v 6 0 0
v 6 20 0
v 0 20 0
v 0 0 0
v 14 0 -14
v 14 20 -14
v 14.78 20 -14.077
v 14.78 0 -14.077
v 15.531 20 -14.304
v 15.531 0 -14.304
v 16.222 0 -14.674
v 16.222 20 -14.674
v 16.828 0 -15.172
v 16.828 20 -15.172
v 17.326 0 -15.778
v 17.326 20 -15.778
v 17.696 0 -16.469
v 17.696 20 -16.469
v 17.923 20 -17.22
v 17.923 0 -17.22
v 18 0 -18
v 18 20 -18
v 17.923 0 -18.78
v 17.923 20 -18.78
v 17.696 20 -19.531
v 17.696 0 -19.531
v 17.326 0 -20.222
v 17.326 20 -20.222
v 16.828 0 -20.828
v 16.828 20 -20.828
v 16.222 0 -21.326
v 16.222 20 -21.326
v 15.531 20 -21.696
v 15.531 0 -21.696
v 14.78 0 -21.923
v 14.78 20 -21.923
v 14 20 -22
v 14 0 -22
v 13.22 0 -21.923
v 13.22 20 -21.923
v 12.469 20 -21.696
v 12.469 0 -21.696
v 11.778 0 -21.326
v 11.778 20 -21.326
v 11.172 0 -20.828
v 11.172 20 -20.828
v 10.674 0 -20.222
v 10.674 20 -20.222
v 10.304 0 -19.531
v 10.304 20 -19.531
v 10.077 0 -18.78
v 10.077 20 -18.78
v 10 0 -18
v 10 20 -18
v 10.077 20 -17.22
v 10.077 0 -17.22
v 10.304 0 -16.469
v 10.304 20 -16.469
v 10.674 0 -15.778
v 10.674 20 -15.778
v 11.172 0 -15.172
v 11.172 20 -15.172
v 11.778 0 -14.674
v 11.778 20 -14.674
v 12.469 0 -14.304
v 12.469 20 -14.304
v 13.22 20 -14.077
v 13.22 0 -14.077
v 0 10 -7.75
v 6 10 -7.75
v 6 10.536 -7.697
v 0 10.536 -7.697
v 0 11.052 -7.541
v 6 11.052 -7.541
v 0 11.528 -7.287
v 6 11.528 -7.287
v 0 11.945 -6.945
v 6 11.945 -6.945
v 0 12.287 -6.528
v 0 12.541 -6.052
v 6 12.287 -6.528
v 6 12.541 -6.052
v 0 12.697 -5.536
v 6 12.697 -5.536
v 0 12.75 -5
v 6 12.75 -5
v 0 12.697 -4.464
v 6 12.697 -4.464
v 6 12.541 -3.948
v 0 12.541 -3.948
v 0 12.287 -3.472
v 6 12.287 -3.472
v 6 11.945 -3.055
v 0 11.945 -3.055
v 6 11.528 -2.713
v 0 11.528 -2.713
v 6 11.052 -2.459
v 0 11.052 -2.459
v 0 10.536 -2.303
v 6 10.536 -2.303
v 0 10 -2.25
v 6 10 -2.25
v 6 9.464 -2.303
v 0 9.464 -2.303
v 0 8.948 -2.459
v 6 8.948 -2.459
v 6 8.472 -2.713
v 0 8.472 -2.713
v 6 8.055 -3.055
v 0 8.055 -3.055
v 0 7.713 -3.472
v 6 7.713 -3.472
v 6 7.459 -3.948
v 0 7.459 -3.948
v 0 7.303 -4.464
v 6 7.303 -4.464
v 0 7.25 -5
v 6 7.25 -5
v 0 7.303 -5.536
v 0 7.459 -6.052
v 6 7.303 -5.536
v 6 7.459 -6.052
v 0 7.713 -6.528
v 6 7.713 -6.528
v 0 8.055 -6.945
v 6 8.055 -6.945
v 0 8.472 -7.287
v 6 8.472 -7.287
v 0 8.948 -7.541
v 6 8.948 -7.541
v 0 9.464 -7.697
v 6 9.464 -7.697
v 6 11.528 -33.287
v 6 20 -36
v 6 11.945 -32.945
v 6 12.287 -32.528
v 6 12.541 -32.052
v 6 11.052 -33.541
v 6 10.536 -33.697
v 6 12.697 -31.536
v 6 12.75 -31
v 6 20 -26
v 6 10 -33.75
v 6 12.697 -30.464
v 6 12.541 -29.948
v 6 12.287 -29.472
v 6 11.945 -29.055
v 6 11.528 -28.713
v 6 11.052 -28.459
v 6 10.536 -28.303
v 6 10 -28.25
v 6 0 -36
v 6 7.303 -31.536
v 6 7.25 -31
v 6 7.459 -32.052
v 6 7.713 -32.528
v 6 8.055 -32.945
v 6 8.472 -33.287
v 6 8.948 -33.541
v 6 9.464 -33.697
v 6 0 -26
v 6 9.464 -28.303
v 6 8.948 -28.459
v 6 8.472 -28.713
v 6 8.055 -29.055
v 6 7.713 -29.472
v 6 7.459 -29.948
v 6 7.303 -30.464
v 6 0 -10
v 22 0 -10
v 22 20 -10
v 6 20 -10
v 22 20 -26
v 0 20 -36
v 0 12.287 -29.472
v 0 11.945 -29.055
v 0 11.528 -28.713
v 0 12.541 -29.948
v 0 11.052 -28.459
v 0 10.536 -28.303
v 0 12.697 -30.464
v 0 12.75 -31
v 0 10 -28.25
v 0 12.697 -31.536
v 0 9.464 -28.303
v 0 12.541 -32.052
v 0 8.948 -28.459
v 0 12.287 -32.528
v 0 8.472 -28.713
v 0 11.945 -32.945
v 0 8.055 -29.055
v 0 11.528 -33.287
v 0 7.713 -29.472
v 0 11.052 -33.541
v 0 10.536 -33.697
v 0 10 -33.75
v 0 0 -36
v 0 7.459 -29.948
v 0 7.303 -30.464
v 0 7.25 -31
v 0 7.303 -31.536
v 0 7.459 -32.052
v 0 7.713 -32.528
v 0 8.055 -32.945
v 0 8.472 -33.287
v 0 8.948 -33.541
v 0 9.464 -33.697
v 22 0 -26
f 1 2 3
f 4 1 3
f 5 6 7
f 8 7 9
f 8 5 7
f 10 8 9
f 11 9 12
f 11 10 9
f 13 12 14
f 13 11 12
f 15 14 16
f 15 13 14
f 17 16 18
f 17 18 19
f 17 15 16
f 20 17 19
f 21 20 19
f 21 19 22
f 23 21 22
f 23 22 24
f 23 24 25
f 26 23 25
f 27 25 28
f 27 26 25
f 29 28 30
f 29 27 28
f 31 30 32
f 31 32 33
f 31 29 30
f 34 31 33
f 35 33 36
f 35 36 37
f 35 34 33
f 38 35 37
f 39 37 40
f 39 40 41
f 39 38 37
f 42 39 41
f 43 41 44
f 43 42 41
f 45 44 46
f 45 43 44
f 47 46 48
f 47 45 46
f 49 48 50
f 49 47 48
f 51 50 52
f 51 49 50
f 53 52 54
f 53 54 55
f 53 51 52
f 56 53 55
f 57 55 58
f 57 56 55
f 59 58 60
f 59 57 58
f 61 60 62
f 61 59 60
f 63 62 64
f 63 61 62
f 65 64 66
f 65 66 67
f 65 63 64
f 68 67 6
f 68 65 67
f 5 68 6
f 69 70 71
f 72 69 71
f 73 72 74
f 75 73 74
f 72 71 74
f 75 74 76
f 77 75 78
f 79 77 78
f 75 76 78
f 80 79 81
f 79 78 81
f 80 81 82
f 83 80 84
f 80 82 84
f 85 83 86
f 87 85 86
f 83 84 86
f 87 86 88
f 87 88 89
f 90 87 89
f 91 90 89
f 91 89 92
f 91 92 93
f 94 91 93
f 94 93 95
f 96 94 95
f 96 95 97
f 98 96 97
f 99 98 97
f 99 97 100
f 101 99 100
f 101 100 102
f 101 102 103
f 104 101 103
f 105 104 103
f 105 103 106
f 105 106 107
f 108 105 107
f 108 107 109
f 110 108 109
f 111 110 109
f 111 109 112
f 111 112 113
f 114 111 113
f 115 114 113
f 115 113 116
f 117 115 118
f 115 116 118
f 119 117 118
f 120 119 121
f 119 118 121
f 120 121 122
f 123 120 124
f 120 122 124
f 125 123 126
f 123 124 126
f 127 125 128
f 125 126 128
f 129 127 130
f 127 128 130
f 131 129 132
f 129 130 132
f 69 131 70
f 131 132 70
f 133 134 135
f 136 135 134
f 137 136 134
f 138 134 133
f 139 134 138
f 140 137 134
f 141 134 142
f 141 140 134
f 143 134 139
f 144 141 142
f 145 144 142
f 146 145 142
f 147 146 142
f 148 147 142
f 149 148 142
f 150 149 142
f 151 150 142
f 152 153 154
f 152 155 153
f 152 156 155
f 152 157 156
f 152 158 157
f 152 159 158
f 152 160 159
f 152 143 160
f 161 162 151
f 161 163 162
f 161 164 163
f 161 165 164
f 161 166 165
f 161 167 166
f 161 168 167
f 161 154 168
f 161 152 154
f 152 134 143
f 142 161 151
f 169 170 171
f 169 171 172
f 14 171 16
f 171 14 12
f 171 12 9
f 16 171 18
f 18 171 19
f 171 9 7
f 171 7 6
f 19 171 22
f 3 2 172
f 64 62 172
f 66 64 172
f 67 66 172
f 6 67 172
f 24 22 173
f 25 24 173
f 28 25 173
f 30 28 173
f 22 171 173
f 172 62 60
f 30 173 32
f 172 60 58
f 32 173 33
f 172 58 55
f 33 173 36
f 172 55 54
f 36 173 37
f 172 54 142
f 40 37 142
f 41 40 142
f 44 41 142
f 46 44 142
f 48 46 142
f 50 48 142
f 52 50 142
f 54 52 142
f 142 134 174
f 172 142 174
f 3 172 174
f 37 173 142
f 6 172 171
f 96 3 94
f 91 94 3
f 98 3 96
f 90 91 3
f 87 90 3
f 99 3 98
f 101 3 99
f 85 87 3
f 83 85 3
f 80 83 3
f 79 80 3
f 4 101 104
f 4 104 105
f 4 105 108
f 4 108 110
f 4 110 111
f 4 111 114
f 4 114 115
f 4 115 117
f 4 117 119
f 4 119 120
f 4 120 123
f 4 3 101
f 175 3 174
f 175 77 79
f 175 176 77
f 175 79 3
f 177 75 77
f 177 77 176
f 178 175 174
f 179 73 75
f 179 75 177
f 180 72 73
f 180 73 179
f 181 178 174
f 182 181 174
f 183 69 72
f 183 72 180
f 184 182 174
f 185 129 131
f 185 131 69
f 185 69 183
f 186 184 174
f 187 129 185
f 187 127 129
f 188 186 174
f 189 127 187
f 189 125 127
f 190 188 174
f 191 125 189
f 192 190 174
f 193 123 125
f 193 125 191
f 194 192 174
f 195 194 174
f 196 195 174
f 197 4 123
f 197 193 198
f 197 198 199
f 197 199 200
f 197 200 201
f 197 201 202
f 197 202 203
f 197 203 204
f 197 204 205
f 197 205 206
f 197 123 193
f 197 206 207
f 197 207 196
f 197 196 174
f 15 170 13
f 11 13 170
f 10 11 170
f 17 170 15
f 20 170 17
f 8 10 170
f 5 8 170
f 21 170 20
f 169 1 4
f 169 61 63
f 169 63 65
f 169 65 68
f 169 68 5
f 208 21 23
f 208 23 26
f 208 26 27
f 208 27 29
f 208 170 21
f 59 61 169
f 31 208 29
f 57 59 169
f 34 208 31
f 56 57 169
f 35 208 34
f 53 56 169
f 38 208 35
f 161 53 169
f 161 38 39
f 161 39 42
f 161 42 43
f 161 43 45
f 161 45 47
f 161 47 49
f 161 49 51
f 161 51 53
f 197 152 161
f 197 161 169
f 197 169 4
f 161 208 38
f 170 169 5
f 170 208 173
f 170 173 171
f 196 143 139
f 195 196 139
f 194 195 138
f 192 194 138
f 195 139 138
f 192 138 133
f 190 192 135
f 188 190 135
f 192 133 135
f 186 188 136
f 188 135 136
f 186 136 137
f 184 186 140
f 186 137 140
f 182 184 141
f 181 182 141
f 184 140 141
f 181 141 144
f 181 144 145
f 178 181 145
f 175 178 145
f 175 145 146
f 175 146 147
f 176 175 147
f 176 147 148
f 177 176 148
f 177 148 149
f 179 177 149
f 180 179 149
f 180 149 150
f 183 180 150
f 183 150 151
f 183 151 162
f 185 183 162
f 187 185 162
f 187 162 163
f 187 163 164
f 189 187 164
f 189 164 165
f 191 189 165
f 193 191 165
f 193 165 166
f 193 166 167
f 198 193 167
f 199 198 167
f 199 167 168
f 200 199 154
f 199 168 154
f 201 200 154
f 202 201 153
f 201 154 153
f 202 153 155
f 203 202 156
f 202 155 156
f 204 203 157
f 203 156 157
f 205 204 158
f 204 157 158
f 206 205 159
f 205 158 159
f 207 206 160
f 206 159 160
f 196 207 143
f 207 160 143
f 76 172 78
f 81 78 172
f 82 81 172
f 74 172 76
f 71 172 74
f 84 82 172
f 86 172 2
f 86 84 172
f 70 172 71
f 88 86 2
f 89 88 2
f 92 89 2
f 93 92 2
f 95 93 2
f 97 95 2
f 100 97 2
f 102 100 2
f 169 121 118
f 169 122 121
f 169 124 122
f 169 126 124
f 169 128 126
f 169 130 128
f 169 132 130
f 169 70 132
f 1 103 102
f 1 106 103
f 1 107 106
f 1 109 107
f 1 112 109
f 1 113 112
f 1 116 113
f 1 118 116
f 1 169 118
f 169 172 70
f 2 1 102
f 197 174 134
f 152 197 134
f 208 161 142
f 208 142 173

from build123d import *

# Parameters (mm, degrees)
SKETCH1_R           = 4
BOSS_EXTRUDE1_DEPTH = 20
SKETCH2_R           = 2.75
CUT_EXTRUDE1_DEPTH  = 10


with BuildPart() as part:
    # Sketch1 → Boss-Extrude1 (new body)
    with BuildSketch(Plane(origin=(0, 0, 0), x_dir=(1, 0, 0), z_dir=(0, 1, 0))):
        Polygon((0, 0), (0, 36), (6, 36), (6, 26), (22, 26), (22, 10), (6, 10), (6, 0), align=None)
        with Locations(Location((14, 18, 0), (0, 0, 270))):
            Circle(SKETCH1_R, mode=Mode.SUBTRACT)
    extrude(amount=BOSS_EXTRUDE1_DEPTH)

    # Sketch2 → Cut-Extrude1 (cut)
    with BuildSketch(Plane(origin=(6, 0, 0), x_dir=(0, 0, -1), z_dir=(1, 0, 0))):
        with Locations((5, 10)):
            Circle(SKETCH2_R)
        with Locations((31, 10)):
            Circle(SKETCH2_R)
    extrude(amount=-CUT_EXTRUDE1_DEPTH, mode=Mode.SUBTRACT)


solid = part.part
